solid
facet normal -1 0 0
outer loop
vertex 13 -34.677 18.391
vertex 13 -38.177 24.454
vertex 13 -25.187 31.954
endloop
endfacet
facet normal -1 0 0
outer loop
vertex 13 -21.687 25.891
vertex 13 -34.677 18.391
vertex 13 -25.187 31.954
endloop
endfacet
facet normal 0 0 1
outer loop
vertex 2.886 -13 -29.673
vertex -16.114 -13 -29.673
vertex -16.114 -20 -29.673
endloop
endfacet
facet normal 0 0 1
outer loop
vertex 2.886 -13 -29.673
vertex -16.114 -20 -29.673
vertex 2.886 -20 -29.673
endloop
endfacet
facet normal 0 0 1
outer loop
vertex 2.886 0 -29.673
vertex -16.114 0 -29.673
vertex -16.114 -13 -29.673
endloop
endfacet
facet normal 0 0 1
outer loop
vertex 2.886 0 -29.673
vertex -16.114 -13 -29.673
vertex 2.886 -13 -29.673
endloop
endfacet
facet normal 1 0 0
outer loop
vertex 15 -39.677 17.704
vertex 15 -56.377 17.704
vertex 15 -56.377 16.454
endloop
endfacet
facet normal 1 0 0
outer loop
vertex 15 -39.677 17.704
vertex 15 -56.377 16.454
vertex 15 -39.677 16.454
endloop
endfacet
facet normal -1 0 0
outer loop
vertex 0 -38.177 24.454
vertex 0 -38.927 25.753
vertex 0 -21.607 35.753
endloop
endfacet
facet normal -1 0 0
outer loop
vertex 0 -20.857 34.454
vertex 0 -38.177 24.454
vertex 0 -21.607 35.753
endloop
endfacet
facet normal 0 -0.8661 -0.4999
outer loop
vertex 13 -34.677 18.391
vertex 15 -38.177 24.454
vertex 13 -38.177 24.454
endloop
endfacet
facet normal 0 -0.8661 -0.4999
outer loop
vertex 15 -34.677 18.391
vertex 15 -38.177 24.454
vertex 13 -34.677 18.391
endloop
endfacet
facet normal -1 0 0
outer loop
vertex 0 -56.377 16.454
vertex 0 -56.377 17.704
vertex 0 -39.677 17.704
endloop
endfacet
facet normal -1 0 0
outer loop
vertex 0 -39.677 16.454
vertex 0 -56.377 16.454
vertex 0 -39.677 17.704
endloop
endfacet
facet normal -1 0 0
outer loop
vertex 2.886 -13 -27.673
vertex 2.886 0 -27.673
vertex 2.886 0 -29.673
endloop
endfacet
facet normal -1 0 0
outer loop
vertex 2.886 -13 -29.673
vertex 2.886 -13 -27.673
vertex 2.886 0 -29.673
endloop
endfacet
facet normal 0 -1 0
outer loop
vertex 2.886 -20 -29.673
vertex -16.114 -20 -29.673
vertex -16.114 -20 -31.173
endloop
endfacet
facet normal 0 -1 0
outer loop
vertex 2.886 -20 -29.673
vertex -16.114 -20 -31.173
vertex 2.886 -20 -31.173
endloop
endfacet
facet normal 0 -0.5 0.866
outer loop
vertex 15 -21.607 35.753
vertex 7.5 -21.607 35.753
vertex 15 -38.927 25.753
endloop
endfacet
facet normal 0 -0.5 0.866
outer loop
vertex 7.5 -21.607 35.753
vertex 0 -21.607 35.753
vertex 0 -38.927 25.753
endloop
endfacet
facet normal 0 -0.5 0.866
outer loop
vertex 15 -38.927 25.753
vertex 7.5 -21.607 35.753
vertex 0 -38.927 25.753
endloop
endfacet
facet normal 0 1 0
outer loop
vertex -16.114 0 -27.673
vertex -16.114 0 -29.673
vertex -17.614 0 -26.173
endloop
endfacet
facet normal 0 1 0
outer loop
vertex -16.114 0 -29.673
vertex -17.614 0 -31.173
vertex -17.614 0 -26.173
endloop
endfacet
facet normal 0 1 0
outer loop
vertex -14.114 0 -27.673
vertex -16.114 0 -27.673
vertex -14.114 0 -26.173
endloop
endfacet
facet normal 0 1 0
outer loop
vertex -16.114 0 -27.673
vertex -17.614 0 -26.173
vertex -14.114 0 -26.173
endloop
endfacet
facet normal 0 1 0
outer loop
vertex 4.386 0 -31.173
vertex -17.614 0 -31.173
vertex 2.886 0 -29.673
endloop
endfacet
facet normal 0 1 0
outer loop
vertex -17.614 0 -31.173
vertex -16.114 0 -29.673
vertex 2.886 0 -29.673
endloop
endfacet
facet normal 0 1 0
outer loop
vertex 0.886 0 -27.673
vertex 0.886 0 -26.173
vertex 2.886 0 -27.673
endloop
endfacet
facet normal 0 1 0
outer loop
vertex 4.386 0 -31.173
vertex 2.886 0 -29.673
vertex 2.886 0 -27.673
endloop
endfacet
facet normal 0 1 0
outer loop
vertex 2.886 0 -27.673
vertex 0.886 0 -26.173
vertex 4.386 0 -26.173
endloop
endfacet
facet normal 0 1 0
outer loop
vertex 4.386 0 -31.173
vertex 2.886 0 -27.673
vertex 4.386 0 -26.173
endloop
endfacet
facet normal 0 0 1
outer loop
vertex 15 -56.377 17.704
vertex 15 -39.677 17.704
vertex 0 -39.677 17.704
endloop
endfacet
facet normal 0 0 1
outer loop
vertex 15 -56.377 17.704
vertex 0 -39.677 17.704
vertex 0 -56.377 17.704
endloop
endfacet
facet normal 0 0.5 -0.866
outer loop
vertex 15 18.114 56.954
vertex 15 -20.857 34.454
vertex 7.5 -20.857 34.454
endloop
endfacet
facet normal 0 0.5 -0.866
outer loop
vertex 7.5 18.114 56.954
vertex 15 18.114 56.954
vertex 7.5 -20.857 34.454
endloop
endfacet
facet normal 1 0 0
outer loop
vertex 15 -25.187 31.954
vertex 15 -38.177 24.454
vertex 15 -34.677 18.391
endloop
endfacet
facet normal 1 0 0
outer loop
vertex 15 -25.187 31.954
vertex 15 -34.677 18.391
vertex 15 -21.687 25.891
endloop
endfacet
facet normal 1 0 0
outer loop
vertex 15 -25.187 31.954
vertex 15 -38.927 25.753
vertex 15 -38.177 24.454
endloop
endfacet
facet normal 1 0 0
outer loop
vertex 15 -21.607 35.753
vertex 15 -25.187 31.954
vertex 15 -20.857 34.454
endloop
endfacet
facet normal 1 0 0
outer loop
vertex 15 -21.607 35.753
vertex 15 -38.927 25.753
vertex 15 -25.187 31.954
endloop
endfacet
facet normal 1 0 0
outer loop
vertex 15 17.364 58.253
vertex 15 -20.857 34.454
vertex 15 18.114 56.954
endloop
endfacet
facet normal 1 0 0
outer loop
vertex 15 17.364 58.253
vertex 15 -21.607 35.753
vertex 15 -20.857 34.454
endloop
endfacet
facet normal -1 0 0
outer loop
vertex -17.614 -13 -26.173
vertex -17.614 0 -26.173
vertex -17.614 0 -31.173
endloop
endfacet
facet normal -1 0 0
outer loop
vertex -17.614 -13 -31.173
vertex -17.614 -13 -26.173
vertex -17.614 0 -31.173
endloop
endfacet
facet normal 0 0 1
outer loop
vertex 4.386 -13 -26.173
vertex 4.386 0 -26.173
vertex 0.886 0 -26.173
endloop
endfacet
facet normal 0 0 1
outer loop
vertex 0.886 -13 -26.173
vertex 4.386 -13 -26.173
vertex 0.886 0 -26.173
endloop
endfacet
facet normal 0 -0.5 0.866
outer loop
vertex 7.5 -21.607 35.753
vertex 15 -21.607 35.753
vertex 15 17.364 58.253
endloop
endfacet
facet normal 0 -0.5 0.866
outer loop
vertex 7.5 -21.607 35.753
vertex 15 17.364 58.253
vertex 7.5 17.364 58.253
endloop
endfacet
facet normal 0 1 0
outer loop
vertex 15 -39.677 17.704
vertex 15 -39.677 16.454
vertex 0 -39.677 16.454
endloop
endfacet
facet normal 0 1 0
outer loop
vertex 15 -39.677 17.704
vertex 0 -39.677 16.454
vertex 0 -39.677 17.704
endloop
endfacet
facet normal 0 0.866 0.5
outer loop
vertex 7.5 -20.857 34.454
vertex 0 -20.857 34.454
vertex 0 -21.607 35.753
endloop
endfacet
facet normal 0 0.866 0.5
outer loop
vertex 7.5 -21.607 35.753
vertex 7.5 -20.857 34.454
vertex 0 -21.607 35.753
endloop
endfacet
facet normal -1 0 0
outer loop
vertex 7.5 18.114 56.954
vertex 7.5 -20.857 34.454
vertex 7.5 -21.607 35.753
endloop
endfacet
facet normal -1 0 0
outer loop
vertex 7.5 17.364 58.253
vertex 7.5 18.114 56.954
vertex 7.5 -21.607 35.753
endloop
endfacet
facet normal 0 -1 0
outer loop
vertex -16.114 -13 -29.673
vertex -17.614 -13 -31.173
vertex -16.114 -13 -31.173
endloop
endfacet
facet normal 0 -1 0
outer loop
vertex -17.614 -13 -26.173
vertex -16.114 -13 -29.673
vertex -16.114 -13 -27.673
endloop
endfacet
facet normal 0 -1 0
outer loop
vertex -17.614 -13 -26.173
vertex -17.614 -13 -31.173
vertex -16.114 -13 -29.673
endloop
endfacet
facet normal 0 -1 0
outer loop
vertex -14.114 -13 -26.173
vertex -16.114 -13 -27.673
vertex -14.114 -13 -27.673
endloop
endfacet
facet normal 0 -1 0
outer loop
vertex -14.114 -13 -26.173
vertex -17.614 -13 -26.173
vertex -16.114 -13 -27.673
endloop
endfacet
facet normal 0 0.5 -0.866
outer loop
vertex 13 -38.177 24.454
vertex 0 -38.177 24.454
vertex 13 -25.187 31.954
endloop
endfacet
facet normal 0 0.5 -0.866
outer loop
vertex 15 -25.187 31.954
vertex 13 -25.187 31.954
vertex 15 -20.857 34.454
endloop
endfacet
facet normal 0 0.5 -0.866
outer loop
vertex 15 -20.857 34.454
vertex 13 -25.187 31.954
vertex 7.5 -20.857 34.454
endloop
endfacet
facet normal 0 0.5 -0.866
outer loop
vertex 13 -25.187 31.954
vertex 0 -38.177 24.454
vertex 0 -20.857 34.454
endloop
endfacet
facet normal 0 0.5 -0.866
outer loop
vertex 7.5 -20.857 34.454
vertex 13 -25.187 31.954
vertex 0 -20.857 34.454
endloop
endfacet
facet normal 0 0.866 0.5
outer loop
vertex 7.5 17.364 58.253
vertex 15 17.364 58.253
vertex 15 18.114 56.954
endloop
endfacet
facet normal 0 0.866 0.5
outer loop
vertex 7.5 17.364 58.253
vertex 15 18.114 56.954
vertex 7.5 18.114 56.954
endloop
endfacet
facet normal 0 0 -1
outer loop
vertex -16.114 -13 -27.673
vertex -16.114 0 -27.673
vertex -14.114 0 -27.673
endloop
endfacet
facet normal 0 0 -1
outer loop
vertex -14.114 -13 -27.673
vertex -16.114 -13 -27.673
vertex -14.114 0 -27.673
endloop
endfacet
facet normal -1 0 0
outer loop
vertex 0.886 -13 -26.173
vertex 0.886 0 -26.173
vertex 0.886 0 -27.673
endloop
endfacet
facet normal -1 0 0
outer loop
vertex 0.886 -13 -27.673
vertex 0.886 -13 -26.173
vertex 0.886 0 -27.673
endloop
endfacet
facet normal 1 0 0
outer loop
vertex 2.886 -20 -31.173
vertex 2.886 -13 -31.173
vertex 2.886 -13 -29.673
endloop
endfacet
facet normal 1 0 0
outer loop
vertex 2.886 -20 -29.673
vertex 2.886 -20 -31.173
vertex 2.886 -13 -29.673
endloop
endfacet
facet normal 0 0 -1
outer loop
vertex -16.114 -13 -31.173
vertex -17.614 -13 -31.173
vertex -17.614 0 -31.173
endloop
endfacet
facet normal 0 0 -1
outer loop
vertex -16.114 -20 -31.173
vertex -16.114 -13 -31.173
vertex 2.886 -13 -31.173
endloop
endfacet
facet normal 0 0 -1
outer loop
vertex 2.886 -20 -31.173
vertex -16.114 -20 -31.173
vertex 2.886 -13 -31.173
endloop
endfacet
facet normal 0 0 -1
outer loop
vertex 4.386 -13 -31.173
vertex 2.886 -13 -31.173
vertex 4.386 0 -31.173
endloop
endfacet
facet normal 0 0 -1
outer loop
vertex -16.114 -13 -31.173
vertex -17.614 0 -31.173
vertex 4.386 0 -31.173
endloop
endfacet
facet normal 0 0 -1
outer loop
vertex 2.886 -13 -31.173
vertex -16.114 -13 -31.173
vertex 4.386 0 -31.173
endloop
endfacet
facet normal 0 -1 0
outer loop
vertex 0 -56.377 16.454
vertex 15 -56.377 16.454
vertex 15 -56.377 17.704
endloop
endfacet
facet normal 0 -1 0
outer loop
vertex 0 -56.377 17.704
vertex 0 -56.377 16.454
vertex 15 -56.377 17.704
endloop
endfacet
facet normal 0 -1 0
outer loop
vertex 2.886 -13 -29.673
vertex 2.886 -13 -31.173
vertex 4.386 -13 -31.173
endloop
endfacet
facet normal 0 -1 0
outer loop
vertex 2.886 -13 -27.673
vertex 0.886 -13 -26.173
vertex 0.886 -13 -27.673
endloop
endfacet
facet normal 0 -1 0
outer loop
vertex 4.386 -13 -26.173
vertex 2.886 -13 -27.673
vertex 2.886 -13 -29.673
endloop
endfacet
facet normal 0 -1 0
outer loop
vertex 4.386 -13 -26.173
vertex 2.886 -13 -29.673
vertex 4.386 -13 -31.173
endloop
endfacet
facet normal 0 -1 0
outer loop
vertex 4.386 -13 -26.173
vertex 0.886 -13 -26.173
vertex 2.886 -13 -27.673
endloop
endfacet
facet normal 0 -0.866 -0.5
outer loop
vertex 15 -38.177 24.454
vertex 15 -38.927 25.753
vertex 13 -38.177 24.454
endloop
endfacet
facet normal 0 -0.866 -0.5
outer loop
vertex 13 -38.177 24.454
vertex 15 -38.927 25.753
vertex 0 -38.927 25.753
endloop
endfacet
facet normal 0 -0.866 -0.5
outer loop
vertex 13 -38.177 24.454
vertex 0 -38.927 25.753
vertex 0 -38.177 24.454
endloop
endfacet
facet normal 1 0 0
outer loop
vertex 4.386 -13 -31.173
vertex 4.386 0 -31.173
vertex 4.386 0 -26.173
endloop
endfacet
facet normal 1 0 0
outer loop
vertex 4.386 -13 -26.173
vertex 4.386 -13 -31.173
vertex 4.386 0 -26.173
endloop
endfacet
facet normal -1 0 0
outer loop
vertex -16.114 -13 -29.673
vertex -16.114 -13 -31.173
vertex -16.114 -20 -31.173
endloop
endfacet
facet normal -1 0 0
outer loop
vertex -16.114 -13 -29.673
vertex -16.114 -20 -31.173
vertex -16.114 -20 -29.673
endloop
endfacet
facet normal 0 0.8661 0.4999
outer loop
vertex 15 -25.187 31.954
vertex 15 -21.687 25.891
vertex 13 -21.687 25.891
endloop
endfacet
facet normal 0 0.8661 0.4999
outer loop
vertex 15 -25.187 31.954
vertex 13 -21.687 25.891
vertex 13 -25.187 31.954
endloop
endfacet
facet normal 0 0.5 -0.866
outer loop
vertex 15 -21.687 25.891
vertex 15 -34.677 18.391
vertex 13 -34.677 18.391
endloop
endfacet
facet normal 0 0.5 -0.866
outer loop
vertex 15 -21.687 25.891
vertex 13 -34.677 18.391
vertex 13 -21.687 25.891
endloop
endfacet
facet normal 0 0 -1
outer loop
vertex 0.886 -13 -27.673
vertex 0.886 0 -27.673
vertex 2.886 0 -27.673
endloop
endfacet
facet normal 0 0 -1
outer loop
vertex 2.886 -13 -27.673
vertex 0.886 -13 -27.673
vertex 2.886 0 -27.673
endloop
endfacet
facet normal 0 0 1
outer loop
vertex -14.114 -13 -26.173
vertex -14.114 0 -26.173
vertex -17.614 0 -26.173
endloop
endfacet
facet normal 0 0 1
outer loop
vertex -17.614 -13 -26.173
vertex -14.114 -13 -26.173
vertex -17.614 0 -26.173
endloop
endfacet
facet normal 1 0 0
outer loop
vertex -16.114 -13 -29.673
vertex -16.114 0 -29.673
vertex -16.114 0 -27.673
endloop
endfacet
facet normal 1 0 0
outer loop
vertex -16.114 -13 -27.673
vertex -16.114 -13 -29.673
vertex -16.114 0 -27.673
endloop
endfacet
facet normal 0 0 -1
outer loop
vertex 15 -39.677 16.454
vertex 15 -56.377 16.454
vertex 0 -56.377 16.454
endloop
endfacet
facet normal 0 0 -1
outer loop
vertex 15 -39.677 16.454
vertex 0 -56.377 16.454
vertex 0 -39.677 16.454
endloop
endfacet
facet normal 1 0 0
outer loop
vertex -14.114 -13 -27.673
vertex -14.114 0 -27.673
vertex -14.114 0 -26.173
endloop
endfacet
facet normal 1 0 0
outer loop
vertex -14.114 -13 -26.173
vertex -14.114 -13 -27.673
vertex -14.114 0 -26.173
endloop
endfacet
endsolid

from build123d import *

# Parameters (mm, degrees)
F1_DEPTH  = 13
F0_W      = 19
F0_H      = 1.5
F2_DEPTH  = 20
F4_DEPTH  = 15
F6_W      = 7.5
F6_H      = 1.5
F7_DEPTH  = 45
F8_W      = 15.2
F8_H      = 1.25
F8_W_2    = 1.5
F9_DEPTH  = 15
F11_DEPTH = 2


# Not quite as in the source:
# - a feature names something its author has since deleted; it is built from what else it names


with BuildPart() as f1:
    # F0 (on Front) → F1 (new body)
    with BuildSketch(Plane.XZ):
        Polygon((-16.114479475, -31.1727552094), (-16.114479475, -29.6727552094), (-16.114479475, -27.6727552094), (-14.114479475, -27.6727552094), (-14.114479475, -26.1727552094), (-17.614479475, -26.1727552094), (-17.614479475, -31.1727552094), align=None)
    extrude(amount=F1_DEPTH)



with BuildPart() as f1b:
    # F0 (on Front) → F1, piece 2 (new body)
    with BuildSketch(Plane.XZ):
        Polygon((2.885520525, -27.6727552094), (2.885520525, -29.6727552094), (2.885520525, -31.1727552094), (4.385520525, -31.1727552094), (4.385520525, -26.1727552094), (0.885520525, -26.1727552094), (0.885520525, -27.6727552094), align=None)
    extrude(amount=F1_DEPTH)


with BuildPart() as f1_1:
    add(f1.part)

    add(f1b.part)  # F2 merges F1b
    # F0 (on Front) → F2 (join)
    with BuildSketch(Plane.XZ):
        with Locations((-6.614479475, -30.4227552094)):
            Rectangle(F0_W, F0_H)
    extrude(amount=F2_DEPTH)


with BuildPart() as f4:
    # F3 (on Right) → F4 (new body)
    with BuildSketch(Plane.YZ):
        Polygon((-21.6069256863, -37.1474194041), (-38.927433762, -47.1474194041), (-38.177433762, -48.4464575097), (-20.8569256863, -38.4464575097), align=None)
    extrude(amount=F4_DEPTH)


with BuildPart() as f4_1:
    # F5: moved
    add(f4.part.moved(Location((0, 0, 72.9))))

    # F6 (on face) → F7 (join)
    with BuildSketch(Plane(origin=(0, -0.7238727413, -0.417928122), x_dir=(-1, 0, 0), z_dir=(0, 0.8660254038, 0.5))):
        with Locations((-11.25, 41.0161058901)):
            Rectangle(F6_W, F6_H)
    extrude(amount=F7_DEPTH)

    # F10 (on face) → F11 (join)
    with BuildSketch(Plane.YZ.offset(15)):
        Polygon((-25.1870527052, 31.9535424903), (-38.177433762, 24.4535424903), (-34.677433762, 18.3913646638), (-21.6870527052, 25.8913646638), align=None)
    extrude(amount=-F11_DEPTH)


with BuildPart() as f9:
    # F8 (on face) → F9 (new body)
    with BuildSketch(Plane.YZ.offset(15)):
        with Locations((-47.277433762, 17.0785424903)):
            Rectangle(F8_W, F8_H)
        with Locations((-55.627433762, 17.0785424903)):
            Rectangle(F8_W_2, F8_H)
    extrude(amount=-F9_DEPTH)


solid = Compound([f1_1.part, f4_1.part, f9.part])
